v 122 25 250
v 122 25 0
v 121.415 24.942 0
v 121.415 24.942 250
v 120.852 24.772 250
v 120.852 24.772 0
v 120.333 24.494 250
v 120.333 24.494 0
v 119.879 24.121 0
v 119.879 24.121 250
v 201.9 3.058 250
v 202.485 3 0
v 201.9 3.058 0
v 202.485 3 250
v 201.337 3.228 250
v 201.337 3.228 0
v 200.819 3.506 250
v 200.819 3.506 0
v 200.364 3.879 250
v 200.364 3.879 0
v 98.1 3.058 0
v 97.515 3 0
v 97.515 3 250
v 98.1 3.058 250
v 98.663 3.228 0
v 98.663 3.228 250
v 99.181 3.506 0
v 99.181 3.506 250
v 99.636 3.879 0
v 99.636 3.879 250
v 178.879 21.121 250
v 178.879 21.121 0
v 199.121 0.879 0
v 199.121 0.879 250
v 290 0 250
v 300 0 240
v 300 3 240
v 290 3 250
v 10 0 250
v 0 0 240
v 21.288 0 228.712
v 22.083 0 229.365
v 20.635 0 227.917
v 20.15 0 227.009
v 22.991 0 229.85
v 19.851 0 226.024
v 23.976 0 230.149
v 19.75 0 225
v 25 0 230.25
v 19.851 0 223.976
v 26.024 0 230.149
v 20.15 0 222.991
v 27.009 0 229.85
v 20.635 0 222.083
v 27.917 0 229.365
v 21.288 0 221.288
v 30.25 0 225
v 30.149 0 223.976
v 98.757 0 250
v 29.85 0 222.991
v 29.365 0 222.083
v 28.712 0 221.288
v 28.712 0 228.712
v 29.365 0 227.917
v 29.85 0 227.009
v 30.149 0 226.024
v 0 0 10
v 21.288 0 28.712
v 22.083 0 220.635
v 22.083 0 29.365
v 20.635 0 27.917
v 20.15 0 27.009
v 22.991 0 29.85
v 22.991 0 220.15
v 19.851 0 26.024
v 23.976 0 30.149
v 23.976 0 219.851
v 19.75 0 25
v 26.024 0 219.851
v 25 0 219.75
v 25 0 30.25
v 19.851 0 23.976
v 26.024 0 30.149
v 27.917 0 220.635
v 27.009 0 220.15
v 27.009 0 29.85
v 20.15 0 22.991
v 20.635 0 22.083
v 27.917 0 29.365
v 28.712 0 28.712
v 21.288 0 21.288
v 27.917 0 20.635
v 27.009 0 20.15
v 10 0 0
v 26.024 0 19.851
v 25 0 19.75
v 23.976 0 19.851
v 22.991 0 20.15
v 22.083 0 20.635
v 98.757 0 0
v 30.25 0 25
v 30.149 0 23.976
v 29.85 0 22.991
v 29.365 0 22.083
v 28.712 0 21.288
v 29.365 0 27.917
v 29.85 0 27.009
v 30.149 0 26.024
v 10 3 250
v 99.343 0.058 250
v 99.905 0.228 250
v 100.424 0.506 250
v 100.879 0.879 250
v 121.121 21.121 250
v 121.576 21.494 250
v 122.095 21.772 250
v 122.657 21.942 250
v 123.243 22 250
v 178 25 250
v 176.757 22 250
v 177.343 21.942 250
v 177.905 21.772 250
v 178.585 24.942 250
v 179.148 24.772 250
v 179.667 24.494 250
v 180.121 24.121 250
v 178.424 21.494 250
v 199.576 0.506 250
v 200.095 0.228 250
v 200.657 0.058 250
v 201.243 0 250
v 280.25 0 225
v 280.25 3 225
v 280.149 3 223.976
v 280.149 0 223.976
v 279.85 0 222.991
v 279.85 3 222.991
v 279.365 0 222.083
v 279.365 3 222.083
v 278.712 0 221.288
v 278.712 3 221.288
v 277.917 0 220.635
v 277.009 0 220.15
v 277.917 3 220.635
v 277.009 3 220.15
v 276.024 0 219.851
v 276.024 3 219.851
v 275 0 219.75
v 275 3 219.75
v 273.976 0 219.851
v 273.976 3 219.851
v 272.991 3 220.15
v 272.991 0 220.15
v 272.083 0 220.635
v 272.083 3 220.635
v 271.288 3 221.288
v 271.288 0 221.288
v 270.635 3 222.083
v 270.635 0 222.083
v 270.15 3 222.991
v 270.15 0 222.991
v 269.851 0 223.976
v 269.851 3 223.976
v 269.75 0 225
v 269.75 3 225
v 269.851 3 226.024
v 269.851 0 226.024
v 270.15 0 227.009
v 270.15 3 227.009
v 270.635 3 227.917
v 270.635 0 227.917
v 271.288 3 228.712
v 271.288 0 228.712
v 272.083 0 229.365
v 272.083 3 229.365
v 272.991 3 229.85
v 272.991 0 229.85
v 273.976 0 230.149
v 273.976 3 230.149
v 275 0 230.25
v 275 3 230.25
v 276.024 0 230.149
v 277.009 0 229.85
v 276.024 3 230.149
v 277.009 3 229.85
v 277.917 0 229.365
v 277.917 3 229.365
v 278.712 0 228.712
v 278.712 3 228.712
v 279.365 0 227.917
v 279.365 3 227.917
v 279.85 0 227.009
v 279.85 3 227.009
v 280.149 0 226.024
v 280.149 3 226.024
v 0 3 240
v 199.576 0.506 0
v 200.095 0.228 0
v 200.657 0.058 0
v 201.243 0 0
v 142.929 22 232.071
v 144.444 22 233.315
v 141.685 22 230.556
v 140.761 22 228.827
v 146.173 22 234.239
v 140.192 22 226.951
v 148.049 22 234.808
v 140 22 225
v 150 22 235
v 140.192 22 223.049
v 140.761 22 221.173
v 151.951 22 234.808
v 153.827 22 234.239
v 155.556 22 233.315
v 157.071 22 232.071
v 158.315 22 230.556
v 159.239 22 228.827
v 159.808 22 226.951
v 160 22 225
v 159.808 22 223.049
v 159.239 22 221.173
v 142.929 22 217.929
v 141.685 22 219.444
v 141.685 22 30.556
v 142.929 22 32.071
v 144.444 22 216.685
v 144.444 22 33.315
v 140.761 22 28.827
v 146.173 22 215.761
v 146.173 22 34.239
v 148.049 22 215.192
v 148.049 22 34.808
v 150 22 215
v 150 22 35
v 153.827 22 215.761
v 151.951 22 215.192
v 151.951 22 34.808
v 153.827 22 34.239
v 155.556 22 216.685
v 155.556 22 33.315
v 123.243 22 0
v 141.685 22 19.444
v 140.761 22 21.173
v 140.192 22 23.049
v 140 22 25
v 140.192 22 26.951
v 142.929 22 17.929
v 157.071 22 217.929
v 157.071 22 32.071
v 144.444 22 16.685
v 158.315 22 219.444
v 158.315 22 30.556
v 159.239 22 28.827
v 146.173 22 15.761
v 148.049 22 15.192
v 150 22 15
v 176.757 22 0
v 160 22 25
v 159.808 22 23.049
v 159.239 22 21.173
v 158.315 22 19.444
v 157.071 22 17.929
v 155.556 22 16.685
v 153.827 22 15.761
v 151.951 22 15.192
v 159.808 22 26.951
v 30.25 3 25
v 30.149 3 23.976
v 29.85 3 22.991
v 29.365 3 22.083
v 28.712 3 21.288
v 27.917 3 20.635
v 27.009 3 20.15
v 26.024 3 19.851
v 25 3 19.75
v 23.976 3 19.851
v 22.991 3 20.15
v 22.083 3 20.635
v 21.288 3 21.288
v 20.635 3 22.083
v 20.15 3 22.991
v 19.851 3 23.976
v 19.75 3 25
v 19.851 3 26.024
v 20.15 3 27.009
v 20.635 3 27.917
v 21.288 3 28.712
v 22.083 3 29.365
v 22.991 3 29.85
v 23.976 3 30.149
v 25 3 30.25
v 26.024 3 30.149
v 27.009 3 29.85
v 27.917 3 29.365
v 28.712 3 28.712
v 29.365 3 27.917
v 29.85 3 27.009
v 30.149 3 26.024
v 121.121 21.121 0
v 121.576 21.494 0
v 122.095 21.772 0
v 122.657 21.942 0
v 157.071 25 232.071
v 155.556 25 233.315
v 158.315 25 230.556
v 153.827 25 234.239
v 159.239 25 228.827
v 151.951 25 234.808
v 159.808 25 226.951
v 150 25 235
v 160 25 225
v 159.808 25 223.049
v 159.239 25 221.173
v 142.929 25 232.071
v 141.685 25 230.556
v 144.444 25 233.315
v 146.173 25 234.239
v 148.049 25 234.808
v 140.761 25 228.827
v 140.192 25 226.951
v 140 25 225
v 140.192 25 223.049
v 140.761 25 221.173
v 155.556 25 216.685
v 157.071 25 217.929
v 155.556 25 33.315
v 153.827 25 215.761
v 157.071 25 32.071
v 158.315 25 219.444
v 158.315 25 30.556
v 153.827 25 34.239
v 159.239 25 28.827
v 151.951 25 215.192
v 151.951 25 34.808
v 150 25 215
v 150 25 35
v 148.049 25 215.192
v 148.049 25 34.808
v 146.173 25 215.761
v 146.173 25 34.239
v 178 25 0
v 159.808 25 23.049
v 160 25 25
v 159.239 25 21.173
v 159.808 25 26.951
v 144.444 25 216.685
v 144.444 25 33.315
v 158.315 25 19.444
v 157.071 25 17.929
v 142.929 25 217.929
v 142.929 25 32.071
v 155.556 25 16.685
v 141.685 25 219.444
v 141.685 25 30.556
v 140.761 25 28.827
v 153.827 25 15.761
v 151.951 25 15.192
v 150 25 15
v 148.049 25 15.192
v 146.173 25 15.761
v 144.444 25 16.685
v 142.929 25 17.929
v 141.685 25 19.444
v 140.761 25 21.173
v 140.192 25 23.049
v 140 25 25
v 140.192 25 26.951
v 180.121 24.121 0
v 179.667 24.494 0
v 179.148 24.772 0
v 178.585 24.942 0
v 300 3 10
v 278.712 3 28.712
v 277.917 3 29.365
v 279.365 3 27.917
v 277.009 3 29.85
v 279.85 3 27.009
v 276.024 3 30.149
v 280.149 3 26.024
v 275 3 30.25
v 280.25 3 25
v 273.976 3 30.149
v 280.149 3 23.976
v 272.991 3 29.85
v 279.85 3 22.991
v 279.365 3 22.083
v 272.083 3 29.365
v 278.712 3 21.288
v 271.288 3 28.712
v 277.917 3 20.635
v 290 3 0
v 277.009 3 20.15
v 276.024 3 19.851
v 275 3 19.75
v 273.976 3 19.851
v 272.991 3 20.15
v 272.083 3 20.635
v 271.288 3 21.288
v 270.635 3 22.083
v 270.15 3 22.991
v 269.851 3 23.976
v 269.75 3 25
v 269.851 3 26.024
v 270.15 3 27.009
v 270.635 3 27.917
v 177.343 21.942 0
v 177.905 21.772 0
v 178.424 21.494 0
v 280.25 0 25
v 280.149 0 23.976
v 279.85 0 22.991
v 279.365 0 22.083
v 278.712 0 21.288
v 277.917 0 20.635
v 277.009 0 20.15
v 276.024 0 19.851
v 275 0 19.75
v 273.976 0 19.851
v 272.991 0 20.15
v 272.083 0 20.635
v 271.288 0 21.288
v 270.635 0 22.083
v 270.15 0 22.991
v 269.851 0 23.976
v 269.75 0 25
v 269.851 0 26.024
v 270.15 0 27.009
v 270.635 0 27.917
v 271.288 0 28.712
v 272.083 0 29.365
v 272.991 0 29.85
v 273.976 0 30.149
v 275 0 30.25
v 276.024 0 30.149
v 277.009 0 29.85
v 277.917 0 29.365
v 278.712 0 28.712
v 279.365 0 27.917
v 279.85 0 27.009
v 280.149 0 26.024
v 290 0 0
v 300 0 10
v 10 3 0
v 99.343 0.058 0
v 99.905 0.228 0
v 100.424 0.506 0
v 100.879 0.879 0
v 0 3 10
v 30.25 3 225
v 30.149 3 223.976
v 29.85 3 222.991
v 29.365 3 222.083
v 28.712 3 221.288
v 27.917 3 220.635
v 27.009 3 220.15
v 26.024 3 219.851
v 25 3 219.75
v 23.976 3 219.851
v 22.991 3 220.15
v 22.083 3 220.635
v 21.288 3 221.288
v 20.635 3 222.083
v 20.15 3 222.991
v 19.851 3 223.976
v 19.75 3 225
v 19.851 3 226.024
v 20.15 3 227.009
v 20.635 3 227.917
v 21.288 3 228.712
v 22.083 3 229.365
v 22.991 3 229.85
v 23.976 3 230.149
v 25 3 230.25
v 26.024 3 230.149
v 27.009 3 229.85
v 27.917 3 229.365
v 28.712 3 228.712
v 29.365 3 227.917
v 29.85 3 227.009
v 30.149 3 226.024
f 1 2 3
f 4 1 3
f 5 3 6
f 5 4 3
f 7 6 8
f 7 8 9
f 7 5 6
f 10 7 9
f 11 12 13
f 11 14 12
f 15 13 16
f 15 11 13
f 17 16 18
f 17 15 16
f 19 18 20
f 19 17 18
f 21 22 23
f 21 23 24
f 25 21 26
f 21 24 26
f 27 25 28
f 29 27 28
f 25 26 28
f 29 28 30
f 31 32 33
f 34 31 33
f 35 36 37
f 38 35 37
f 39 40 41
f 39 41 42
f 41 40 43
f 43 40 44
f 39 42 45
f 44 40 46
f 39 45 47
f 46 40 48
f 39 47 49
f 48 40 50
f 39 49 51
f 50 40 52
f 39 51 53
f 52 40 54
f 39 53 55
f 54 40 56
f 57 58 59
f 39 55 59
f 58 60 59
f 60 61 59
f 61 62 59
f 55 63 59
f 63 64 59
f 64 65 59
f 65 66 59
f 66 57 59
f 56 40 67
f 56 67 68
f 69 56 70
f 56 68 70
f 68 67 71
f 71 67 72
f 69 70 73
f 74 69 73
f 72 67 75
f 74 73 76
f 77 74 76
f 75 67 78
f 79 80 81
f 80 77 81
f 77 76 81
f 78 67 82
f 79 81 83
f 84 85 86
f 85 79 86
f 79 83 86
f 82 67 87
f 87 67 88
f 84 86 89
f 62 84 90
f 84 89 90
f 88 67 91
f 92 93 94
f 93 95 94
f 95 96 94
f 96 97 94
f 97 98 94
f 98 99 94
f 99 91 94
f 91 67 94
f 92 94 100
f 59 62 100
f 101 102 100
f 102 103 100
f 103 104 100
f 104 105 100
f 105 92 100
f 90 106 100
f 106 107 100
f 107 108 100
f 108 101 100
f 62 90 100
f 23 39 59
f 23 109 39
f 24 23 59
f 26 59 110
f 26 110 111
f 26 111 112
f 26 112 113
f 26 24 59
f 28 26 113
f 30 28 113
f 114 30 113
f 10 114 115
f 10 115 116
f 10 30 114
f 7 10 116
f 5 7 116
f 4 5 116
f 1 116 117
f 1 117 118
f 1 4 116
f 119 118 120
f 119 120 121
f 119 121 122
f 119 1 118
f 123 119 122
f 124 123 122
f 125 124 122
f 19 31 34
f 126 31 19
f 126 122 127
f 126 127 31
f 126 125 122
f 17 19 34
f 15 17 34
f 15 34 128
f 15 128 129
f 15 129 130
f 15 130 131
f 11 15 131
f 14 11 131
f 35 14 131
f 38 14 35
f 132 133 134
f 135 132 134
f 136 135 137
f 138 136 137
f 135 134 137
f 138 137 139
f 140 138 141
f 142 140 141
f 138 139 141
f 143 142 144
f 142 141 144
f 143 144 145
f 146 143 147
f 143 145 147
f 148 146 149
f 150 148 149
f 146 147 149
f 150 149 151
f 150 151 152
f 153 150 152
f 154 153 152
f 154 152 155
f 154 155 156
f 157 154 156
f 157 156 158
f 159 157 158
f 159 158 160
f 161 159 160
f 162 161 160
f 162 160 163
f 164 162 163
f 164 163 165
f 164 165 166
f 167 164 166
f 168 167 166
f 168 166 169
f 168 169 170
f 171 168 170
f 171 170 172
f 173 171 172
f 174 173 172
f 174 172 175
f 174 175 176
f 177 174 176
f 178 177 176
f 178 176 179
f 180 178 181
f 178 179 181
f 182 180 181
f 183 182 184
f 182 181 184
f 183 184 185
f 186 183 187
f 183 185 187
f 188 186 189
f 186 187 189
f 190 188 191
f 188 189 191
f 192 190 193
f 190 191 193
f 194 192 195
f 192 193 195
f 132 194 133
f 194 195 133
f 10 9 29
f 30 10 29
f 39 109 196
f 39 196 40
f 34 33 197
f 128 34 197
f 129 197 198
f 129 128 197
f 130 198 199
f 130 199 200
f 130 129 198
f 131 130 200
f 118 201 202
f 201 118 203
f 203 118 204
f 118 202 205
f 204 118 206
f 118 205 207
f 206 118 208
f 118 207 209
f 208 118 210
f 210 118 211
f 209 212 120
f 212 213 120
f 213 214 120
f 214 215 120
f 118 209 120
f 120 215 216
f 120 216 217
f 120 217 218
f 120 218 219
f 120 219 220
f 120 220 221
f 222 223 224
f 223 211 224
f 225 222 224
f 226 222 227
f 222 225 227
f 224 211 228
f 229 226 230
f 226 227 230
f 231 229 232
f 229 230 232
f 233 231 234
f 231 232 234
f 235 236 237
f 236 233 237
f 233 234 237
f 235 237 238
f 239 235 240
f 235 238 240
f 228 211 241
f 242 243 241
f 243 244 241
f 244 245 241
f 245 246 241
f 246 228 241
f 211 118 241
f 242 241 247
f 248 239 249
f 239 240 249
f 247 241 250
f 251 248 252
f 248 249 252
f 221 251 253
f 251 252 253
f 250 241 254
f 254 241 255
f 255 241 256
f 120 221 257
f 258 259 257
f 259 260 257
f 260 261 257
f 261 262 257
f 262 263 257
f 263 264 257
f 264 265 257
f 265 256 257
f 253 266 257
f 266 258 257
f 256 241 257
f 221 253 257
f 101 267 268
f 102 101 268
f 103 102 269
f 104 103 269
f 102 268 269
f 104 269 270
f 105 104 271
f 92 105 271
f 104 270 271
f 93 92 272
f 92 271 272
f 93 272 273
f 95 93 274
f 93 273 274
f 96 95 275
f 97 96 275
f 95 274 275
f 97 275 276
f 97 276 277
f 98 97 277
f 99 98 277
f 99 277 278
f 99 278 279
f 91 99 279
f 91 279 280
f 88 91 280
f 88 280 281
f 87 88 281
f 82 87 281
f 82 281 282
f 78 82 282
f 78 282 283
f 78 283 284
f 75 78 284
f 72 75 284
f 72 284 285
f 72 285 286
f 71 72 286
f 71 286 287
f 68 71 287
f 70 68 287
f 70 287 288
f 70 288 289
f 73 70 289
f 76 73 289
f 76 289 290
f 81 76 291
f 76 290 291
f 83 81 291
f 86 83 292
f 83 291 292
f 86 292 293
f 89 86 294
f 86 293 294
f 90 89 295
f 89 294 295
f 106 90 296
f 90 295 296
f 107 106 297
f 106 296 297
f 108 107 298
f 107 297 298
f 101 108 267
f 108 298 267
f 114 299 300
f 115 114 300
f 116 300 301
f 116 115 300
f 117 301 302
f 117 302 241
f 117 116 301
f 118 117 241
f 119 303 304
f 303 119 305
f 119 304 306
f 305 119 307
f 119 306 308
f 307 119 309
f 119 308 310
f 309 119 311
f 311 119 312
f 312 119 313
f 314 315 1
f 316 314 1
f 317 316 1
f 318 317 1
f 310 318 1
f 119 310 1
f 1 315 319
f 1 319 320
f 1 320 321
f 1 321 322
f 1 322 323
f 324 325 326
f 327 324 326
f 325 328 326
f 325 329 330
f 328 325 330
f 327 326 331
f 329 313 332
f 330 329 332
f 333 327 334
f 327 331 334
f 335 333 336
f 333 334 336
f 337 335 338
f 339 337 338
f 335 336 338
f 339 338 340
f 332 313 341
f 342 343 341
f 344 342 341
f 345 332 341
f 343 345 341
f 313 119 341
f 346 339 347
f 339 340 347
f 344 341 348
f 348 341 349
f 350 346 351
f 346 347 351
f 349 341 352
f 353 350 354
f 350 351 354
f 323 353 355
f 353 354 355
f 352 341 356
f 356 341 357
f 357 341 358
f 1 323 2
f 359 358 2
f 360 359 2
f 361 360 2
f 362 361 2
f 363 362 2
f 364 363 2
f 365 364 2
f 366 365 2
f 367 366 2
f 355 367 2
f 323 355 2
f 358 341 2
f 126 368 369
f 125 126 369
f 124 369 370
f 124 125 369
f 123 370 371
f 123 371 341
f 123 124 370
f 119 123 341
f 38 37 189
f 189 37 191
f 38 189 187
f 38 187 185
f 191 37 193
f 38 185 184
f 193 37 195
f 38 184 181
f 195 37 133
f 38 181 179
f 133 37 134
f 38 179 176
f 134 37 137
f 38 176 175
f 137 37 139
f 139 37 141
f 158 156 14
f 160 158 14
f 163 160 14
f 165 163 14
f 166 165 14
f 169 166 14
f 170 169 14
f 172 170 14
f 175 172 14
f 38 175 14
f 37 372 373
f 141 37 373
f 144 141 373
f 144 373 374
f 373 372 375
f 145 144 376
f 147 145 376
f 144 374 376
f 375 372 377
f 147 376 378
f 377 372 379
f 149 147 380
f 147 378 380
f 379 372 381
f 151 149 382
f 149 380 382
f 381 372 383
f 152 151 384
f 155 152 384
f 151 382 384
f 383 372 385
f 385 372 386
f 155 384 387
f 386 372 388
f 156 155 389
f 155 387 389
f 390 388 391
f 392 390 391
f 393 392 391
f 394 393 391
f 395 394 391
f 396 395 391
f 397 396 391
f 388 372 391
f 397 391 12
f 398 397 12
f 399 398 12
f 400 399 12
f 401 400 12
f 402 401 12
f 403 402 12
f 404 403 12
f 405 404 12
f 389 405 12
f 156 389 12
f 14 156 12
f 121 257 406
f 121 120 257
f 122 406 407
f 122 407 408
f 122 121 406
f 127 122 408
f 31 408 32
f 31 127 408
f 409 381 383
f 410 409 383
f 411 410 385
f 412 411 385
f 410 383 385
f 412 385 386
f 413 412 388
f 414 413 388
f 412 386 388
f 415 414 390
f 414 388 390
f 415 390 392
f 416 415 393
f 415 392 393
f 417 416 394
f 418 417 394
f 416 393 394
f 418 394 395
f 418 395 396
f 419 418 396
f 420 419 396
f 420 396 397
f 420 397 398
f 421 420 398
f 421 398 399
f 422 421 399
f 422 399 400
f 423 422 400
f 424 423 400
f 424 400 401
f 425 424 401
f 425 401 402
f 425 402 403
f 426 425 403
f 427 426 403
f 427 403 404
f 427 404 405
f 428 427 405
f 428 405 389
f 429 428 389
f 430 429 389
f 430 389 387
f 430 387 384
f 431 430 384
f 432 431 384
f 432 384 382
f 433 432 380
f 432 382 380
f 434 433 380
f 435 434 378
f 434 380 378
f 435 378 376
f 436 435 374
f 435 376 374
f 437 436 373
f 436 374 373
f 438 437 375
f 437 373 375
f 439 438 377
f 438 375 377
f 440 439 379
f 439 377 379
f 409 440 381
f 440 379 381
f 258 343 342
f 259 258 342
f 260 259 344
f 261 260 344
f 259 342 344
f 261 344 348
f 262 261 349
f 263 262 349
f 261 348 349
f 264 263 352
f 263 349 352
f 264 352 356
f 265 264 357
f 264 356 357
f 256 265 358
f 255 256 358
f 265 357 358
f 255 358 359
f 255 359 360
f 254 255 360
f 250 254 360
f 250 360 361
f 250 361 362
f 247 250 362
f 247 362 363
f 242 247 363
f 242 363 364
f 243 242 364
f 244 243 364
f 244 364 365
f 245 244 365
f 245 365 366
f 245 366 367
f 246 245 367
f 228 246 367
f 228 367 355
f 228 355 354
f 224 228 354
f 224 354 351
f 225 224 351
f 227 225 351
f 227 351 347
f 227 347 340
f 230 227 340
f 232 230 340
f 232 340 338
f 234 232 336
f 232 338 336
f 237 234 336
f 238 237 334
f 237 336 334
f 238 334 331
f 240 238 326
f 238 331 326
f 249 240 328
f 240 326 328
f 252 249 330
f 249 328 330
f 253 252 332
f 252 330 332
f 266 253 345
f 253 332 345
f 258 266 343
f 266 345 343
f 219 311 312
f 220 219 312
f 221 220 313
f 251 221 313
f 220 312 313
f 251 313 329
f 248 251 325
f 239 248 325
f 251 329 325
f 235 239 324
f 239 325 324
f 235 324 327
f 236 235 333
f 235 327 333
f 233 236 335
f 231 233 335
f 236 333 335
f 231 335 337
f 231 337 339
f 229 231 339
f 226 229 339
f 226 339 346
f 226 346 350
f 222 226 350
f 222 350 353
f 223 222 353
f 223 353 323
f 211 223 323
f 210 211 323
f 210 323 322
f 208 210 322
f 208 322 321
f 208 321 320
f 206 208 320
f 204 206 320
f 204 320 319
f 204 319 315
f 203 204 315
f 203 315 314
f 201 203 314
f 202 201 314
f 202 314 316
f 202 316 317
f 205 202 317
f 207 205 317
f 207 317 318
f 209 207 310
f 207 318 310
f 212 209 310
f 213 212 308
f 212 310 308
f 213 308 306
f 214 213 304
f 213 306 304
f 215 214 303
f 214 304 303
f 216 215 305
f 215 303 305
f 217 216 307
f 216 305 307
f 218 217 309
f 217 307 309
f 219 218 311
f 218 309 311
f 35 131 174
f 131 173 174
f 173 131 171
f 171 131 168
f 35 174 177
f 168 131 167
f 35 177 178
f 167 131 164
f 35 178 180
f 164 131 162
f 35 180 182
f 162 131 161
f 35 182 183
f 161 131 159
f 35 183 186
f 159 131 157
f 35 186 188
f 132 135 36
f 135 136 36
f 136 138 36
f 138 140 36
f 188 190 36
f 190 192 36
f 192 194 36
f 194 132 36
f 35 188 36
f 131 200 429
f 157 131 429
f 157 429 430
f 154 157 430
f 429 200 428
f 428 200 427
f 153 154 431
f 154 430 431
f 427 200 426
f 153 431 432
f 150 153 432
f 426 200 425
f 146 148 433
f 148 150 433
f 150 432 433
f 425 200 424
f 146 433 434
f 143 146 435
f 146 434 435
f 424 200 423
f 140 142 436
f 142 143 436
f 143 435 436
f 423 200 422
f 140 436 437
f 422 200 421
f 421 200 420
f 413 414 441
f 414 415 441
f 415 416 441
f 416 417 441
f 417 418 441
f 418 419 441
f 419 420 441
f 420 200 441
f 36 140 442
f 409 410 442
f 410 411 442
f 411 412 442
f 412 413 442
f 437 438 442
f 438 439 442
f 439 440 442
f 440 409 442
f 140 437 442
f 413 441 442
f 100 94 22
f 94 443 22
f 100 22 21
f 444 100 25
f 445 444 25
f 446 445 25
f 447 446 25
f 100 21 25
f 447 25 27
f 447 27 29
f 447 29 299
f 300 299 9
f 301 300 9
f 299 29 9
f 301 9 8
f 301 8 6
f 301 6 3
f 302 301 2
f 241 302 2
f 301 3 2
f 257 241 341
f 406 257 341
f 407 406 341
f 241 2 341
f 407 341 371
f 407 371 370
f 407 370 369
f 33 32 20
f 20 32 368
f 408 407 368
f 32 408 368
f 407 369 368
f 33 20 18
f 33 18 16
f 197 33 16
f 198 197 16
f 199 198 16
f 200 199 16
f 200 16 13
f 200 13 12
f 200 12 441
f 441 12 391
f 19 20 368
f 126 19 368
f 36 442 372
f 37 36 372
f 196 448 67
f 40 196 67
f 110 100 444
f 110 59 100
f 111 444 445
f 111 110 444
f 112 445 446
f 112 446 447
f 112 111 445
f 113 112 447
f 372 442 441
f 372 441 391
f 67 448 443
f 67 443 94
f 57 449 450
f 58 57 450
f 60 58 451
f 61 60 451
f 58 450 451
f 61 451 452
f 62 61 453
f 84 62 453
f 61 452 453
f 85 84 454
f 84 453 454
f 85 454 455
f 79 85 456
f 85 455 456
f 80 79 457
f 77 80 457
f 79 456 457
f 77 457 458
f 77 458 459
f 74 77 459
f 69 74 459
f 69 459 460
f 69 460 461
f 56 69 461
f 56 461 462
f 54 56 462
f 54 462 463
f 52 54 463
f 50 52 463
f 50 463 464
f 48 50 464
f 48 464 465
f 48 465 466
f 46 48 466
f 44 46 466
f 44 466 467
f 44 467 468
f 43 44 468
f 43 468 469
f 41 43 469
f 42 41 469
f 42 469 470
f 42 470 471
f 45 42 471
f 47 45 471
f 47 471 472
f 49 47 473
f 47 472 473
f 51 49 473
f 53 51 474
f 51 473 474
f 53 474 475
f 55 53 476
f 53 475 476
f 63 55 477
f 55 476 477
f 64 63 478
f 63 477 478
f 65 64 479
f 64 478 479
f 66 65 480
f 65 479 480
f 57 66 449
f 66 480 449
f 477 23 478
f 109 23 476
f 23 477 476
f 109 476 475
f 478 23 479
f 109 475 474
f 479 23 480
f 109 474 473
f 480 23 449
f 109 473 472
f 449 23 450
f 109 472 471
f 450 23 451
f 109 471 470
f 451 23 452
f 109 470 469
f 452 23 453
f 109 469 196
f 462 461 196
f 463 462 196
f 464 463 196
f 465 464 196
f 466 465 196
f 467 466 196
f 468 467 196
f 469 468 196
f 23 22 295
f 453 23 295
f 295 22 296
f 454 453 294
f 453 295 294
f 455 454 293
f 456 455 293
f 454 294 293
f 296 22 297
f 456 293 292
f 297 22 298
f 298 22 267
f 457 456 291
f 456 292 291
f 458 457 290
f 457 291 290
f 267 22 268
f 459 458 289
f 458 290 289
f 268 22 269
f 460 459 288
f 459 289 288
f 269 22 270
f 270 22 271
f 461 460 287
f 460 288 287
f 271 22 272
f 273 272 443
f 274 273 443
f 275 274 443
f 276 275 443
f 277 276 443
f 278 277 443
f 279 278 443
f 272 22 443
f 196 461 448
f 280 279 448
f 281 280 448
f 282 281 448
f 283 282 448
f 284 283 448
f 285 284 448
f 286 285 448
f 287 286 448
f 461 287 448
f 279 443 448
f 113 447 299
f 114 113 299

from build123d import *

# Parameters (mm, degrees)
EXTRUDE_1_DEPTH           = 250
HOLE_WIZARD_3_0_3_1_D     = 20
HOLE_WIZARD_3_0_3_1_DEPTH = 42.5
HOLE_WIZARD_3_0_3_1_TIP   = 6.00860619
FILLET_1_R                = 3
HOLE_WIZARD_10_5_10_5_1_D = 10.5
CHAMFER_1_SIZE            = 10


with BuildPart() as part:
    # 草图1 → 凸台-拉伸1 (new body)
    with BuildSketch(Plane.XY):
        Polygon((0, 0), (100, 0), (122, 22), (178, 22), (200, 0), (300, 0), (300, 3), (201.242640687, 3), (179.242640687, 25), (120.757359313, 25), (98.757359313, 3), (0, 3), align=None)
    extrude(amount=EXTRUDE_1_DEPTH)

    # Ø3.0 (3) 直径孔1
    with Locations(Plane(origin=(0, 22, 0), x_dir=(-1, 0, 0), z_dir=(0, -1, 0))):
        with Locations((-150, -225), (-150, -25)):
            Hole(HOLE_WIZARD_3_0_3_1_D / 2, depth=HOLE_WIZARD_3_0_3_1_DEPTH)
            with Locations((0, 0, -(HOLE_WIZARD_3_0_3_1_DEPTH + HOLE_WIZARD_3_0_3_1_TIP / 2))):  # 118° drill point
                Cone(0, HOLE_WIZARD_3_0_3_1_D / 2, HOLE_WIZARD_3_0_3_1_TIP, mode=Mode.SUBTRACT)

    # 圆角1
    fillet_1_edges = [part.edges().sort_by_distance(p)[0] for p in [
        (98.757359313, 3, 125),
        (120.757359313, 25, 125),
        (179.242640687, 25, 125),
        (201.242640687, 3, 125),
        (200, 0, 125),
        (178, 22, 125),
        (122, 22, 125),
        (100, 0, 125),
    ]]
    fillet(fillet_1_edges, radius=FILLET_1_R)

    # Ø10.5 (10.5) 直径孔1 (through all)
    with Locations(Plane(origin=(0, 0, 0), x_dir=(-1, 0, 0), z_dir=(0, -1, 0))):
        with Locations((-25, -225), (-25, -25), (-275, -225), (-275, -25)):
            Hole(HOLE_WIZARD_10_5_10_5_1_D / 2)

    # 倒角1
    chamfer_1_edges = [part.edges().sort_by_distance(p)[0] for p in [
        (300, 1.5, 0),
        (0, 1.5, 0),
        (300, 1.5, 250),
        (0, 1.5, 250),
    ]]
    chamfer(chamfer_1_edges, length=CHAMFER_1_SIZE)


solid = part.part
